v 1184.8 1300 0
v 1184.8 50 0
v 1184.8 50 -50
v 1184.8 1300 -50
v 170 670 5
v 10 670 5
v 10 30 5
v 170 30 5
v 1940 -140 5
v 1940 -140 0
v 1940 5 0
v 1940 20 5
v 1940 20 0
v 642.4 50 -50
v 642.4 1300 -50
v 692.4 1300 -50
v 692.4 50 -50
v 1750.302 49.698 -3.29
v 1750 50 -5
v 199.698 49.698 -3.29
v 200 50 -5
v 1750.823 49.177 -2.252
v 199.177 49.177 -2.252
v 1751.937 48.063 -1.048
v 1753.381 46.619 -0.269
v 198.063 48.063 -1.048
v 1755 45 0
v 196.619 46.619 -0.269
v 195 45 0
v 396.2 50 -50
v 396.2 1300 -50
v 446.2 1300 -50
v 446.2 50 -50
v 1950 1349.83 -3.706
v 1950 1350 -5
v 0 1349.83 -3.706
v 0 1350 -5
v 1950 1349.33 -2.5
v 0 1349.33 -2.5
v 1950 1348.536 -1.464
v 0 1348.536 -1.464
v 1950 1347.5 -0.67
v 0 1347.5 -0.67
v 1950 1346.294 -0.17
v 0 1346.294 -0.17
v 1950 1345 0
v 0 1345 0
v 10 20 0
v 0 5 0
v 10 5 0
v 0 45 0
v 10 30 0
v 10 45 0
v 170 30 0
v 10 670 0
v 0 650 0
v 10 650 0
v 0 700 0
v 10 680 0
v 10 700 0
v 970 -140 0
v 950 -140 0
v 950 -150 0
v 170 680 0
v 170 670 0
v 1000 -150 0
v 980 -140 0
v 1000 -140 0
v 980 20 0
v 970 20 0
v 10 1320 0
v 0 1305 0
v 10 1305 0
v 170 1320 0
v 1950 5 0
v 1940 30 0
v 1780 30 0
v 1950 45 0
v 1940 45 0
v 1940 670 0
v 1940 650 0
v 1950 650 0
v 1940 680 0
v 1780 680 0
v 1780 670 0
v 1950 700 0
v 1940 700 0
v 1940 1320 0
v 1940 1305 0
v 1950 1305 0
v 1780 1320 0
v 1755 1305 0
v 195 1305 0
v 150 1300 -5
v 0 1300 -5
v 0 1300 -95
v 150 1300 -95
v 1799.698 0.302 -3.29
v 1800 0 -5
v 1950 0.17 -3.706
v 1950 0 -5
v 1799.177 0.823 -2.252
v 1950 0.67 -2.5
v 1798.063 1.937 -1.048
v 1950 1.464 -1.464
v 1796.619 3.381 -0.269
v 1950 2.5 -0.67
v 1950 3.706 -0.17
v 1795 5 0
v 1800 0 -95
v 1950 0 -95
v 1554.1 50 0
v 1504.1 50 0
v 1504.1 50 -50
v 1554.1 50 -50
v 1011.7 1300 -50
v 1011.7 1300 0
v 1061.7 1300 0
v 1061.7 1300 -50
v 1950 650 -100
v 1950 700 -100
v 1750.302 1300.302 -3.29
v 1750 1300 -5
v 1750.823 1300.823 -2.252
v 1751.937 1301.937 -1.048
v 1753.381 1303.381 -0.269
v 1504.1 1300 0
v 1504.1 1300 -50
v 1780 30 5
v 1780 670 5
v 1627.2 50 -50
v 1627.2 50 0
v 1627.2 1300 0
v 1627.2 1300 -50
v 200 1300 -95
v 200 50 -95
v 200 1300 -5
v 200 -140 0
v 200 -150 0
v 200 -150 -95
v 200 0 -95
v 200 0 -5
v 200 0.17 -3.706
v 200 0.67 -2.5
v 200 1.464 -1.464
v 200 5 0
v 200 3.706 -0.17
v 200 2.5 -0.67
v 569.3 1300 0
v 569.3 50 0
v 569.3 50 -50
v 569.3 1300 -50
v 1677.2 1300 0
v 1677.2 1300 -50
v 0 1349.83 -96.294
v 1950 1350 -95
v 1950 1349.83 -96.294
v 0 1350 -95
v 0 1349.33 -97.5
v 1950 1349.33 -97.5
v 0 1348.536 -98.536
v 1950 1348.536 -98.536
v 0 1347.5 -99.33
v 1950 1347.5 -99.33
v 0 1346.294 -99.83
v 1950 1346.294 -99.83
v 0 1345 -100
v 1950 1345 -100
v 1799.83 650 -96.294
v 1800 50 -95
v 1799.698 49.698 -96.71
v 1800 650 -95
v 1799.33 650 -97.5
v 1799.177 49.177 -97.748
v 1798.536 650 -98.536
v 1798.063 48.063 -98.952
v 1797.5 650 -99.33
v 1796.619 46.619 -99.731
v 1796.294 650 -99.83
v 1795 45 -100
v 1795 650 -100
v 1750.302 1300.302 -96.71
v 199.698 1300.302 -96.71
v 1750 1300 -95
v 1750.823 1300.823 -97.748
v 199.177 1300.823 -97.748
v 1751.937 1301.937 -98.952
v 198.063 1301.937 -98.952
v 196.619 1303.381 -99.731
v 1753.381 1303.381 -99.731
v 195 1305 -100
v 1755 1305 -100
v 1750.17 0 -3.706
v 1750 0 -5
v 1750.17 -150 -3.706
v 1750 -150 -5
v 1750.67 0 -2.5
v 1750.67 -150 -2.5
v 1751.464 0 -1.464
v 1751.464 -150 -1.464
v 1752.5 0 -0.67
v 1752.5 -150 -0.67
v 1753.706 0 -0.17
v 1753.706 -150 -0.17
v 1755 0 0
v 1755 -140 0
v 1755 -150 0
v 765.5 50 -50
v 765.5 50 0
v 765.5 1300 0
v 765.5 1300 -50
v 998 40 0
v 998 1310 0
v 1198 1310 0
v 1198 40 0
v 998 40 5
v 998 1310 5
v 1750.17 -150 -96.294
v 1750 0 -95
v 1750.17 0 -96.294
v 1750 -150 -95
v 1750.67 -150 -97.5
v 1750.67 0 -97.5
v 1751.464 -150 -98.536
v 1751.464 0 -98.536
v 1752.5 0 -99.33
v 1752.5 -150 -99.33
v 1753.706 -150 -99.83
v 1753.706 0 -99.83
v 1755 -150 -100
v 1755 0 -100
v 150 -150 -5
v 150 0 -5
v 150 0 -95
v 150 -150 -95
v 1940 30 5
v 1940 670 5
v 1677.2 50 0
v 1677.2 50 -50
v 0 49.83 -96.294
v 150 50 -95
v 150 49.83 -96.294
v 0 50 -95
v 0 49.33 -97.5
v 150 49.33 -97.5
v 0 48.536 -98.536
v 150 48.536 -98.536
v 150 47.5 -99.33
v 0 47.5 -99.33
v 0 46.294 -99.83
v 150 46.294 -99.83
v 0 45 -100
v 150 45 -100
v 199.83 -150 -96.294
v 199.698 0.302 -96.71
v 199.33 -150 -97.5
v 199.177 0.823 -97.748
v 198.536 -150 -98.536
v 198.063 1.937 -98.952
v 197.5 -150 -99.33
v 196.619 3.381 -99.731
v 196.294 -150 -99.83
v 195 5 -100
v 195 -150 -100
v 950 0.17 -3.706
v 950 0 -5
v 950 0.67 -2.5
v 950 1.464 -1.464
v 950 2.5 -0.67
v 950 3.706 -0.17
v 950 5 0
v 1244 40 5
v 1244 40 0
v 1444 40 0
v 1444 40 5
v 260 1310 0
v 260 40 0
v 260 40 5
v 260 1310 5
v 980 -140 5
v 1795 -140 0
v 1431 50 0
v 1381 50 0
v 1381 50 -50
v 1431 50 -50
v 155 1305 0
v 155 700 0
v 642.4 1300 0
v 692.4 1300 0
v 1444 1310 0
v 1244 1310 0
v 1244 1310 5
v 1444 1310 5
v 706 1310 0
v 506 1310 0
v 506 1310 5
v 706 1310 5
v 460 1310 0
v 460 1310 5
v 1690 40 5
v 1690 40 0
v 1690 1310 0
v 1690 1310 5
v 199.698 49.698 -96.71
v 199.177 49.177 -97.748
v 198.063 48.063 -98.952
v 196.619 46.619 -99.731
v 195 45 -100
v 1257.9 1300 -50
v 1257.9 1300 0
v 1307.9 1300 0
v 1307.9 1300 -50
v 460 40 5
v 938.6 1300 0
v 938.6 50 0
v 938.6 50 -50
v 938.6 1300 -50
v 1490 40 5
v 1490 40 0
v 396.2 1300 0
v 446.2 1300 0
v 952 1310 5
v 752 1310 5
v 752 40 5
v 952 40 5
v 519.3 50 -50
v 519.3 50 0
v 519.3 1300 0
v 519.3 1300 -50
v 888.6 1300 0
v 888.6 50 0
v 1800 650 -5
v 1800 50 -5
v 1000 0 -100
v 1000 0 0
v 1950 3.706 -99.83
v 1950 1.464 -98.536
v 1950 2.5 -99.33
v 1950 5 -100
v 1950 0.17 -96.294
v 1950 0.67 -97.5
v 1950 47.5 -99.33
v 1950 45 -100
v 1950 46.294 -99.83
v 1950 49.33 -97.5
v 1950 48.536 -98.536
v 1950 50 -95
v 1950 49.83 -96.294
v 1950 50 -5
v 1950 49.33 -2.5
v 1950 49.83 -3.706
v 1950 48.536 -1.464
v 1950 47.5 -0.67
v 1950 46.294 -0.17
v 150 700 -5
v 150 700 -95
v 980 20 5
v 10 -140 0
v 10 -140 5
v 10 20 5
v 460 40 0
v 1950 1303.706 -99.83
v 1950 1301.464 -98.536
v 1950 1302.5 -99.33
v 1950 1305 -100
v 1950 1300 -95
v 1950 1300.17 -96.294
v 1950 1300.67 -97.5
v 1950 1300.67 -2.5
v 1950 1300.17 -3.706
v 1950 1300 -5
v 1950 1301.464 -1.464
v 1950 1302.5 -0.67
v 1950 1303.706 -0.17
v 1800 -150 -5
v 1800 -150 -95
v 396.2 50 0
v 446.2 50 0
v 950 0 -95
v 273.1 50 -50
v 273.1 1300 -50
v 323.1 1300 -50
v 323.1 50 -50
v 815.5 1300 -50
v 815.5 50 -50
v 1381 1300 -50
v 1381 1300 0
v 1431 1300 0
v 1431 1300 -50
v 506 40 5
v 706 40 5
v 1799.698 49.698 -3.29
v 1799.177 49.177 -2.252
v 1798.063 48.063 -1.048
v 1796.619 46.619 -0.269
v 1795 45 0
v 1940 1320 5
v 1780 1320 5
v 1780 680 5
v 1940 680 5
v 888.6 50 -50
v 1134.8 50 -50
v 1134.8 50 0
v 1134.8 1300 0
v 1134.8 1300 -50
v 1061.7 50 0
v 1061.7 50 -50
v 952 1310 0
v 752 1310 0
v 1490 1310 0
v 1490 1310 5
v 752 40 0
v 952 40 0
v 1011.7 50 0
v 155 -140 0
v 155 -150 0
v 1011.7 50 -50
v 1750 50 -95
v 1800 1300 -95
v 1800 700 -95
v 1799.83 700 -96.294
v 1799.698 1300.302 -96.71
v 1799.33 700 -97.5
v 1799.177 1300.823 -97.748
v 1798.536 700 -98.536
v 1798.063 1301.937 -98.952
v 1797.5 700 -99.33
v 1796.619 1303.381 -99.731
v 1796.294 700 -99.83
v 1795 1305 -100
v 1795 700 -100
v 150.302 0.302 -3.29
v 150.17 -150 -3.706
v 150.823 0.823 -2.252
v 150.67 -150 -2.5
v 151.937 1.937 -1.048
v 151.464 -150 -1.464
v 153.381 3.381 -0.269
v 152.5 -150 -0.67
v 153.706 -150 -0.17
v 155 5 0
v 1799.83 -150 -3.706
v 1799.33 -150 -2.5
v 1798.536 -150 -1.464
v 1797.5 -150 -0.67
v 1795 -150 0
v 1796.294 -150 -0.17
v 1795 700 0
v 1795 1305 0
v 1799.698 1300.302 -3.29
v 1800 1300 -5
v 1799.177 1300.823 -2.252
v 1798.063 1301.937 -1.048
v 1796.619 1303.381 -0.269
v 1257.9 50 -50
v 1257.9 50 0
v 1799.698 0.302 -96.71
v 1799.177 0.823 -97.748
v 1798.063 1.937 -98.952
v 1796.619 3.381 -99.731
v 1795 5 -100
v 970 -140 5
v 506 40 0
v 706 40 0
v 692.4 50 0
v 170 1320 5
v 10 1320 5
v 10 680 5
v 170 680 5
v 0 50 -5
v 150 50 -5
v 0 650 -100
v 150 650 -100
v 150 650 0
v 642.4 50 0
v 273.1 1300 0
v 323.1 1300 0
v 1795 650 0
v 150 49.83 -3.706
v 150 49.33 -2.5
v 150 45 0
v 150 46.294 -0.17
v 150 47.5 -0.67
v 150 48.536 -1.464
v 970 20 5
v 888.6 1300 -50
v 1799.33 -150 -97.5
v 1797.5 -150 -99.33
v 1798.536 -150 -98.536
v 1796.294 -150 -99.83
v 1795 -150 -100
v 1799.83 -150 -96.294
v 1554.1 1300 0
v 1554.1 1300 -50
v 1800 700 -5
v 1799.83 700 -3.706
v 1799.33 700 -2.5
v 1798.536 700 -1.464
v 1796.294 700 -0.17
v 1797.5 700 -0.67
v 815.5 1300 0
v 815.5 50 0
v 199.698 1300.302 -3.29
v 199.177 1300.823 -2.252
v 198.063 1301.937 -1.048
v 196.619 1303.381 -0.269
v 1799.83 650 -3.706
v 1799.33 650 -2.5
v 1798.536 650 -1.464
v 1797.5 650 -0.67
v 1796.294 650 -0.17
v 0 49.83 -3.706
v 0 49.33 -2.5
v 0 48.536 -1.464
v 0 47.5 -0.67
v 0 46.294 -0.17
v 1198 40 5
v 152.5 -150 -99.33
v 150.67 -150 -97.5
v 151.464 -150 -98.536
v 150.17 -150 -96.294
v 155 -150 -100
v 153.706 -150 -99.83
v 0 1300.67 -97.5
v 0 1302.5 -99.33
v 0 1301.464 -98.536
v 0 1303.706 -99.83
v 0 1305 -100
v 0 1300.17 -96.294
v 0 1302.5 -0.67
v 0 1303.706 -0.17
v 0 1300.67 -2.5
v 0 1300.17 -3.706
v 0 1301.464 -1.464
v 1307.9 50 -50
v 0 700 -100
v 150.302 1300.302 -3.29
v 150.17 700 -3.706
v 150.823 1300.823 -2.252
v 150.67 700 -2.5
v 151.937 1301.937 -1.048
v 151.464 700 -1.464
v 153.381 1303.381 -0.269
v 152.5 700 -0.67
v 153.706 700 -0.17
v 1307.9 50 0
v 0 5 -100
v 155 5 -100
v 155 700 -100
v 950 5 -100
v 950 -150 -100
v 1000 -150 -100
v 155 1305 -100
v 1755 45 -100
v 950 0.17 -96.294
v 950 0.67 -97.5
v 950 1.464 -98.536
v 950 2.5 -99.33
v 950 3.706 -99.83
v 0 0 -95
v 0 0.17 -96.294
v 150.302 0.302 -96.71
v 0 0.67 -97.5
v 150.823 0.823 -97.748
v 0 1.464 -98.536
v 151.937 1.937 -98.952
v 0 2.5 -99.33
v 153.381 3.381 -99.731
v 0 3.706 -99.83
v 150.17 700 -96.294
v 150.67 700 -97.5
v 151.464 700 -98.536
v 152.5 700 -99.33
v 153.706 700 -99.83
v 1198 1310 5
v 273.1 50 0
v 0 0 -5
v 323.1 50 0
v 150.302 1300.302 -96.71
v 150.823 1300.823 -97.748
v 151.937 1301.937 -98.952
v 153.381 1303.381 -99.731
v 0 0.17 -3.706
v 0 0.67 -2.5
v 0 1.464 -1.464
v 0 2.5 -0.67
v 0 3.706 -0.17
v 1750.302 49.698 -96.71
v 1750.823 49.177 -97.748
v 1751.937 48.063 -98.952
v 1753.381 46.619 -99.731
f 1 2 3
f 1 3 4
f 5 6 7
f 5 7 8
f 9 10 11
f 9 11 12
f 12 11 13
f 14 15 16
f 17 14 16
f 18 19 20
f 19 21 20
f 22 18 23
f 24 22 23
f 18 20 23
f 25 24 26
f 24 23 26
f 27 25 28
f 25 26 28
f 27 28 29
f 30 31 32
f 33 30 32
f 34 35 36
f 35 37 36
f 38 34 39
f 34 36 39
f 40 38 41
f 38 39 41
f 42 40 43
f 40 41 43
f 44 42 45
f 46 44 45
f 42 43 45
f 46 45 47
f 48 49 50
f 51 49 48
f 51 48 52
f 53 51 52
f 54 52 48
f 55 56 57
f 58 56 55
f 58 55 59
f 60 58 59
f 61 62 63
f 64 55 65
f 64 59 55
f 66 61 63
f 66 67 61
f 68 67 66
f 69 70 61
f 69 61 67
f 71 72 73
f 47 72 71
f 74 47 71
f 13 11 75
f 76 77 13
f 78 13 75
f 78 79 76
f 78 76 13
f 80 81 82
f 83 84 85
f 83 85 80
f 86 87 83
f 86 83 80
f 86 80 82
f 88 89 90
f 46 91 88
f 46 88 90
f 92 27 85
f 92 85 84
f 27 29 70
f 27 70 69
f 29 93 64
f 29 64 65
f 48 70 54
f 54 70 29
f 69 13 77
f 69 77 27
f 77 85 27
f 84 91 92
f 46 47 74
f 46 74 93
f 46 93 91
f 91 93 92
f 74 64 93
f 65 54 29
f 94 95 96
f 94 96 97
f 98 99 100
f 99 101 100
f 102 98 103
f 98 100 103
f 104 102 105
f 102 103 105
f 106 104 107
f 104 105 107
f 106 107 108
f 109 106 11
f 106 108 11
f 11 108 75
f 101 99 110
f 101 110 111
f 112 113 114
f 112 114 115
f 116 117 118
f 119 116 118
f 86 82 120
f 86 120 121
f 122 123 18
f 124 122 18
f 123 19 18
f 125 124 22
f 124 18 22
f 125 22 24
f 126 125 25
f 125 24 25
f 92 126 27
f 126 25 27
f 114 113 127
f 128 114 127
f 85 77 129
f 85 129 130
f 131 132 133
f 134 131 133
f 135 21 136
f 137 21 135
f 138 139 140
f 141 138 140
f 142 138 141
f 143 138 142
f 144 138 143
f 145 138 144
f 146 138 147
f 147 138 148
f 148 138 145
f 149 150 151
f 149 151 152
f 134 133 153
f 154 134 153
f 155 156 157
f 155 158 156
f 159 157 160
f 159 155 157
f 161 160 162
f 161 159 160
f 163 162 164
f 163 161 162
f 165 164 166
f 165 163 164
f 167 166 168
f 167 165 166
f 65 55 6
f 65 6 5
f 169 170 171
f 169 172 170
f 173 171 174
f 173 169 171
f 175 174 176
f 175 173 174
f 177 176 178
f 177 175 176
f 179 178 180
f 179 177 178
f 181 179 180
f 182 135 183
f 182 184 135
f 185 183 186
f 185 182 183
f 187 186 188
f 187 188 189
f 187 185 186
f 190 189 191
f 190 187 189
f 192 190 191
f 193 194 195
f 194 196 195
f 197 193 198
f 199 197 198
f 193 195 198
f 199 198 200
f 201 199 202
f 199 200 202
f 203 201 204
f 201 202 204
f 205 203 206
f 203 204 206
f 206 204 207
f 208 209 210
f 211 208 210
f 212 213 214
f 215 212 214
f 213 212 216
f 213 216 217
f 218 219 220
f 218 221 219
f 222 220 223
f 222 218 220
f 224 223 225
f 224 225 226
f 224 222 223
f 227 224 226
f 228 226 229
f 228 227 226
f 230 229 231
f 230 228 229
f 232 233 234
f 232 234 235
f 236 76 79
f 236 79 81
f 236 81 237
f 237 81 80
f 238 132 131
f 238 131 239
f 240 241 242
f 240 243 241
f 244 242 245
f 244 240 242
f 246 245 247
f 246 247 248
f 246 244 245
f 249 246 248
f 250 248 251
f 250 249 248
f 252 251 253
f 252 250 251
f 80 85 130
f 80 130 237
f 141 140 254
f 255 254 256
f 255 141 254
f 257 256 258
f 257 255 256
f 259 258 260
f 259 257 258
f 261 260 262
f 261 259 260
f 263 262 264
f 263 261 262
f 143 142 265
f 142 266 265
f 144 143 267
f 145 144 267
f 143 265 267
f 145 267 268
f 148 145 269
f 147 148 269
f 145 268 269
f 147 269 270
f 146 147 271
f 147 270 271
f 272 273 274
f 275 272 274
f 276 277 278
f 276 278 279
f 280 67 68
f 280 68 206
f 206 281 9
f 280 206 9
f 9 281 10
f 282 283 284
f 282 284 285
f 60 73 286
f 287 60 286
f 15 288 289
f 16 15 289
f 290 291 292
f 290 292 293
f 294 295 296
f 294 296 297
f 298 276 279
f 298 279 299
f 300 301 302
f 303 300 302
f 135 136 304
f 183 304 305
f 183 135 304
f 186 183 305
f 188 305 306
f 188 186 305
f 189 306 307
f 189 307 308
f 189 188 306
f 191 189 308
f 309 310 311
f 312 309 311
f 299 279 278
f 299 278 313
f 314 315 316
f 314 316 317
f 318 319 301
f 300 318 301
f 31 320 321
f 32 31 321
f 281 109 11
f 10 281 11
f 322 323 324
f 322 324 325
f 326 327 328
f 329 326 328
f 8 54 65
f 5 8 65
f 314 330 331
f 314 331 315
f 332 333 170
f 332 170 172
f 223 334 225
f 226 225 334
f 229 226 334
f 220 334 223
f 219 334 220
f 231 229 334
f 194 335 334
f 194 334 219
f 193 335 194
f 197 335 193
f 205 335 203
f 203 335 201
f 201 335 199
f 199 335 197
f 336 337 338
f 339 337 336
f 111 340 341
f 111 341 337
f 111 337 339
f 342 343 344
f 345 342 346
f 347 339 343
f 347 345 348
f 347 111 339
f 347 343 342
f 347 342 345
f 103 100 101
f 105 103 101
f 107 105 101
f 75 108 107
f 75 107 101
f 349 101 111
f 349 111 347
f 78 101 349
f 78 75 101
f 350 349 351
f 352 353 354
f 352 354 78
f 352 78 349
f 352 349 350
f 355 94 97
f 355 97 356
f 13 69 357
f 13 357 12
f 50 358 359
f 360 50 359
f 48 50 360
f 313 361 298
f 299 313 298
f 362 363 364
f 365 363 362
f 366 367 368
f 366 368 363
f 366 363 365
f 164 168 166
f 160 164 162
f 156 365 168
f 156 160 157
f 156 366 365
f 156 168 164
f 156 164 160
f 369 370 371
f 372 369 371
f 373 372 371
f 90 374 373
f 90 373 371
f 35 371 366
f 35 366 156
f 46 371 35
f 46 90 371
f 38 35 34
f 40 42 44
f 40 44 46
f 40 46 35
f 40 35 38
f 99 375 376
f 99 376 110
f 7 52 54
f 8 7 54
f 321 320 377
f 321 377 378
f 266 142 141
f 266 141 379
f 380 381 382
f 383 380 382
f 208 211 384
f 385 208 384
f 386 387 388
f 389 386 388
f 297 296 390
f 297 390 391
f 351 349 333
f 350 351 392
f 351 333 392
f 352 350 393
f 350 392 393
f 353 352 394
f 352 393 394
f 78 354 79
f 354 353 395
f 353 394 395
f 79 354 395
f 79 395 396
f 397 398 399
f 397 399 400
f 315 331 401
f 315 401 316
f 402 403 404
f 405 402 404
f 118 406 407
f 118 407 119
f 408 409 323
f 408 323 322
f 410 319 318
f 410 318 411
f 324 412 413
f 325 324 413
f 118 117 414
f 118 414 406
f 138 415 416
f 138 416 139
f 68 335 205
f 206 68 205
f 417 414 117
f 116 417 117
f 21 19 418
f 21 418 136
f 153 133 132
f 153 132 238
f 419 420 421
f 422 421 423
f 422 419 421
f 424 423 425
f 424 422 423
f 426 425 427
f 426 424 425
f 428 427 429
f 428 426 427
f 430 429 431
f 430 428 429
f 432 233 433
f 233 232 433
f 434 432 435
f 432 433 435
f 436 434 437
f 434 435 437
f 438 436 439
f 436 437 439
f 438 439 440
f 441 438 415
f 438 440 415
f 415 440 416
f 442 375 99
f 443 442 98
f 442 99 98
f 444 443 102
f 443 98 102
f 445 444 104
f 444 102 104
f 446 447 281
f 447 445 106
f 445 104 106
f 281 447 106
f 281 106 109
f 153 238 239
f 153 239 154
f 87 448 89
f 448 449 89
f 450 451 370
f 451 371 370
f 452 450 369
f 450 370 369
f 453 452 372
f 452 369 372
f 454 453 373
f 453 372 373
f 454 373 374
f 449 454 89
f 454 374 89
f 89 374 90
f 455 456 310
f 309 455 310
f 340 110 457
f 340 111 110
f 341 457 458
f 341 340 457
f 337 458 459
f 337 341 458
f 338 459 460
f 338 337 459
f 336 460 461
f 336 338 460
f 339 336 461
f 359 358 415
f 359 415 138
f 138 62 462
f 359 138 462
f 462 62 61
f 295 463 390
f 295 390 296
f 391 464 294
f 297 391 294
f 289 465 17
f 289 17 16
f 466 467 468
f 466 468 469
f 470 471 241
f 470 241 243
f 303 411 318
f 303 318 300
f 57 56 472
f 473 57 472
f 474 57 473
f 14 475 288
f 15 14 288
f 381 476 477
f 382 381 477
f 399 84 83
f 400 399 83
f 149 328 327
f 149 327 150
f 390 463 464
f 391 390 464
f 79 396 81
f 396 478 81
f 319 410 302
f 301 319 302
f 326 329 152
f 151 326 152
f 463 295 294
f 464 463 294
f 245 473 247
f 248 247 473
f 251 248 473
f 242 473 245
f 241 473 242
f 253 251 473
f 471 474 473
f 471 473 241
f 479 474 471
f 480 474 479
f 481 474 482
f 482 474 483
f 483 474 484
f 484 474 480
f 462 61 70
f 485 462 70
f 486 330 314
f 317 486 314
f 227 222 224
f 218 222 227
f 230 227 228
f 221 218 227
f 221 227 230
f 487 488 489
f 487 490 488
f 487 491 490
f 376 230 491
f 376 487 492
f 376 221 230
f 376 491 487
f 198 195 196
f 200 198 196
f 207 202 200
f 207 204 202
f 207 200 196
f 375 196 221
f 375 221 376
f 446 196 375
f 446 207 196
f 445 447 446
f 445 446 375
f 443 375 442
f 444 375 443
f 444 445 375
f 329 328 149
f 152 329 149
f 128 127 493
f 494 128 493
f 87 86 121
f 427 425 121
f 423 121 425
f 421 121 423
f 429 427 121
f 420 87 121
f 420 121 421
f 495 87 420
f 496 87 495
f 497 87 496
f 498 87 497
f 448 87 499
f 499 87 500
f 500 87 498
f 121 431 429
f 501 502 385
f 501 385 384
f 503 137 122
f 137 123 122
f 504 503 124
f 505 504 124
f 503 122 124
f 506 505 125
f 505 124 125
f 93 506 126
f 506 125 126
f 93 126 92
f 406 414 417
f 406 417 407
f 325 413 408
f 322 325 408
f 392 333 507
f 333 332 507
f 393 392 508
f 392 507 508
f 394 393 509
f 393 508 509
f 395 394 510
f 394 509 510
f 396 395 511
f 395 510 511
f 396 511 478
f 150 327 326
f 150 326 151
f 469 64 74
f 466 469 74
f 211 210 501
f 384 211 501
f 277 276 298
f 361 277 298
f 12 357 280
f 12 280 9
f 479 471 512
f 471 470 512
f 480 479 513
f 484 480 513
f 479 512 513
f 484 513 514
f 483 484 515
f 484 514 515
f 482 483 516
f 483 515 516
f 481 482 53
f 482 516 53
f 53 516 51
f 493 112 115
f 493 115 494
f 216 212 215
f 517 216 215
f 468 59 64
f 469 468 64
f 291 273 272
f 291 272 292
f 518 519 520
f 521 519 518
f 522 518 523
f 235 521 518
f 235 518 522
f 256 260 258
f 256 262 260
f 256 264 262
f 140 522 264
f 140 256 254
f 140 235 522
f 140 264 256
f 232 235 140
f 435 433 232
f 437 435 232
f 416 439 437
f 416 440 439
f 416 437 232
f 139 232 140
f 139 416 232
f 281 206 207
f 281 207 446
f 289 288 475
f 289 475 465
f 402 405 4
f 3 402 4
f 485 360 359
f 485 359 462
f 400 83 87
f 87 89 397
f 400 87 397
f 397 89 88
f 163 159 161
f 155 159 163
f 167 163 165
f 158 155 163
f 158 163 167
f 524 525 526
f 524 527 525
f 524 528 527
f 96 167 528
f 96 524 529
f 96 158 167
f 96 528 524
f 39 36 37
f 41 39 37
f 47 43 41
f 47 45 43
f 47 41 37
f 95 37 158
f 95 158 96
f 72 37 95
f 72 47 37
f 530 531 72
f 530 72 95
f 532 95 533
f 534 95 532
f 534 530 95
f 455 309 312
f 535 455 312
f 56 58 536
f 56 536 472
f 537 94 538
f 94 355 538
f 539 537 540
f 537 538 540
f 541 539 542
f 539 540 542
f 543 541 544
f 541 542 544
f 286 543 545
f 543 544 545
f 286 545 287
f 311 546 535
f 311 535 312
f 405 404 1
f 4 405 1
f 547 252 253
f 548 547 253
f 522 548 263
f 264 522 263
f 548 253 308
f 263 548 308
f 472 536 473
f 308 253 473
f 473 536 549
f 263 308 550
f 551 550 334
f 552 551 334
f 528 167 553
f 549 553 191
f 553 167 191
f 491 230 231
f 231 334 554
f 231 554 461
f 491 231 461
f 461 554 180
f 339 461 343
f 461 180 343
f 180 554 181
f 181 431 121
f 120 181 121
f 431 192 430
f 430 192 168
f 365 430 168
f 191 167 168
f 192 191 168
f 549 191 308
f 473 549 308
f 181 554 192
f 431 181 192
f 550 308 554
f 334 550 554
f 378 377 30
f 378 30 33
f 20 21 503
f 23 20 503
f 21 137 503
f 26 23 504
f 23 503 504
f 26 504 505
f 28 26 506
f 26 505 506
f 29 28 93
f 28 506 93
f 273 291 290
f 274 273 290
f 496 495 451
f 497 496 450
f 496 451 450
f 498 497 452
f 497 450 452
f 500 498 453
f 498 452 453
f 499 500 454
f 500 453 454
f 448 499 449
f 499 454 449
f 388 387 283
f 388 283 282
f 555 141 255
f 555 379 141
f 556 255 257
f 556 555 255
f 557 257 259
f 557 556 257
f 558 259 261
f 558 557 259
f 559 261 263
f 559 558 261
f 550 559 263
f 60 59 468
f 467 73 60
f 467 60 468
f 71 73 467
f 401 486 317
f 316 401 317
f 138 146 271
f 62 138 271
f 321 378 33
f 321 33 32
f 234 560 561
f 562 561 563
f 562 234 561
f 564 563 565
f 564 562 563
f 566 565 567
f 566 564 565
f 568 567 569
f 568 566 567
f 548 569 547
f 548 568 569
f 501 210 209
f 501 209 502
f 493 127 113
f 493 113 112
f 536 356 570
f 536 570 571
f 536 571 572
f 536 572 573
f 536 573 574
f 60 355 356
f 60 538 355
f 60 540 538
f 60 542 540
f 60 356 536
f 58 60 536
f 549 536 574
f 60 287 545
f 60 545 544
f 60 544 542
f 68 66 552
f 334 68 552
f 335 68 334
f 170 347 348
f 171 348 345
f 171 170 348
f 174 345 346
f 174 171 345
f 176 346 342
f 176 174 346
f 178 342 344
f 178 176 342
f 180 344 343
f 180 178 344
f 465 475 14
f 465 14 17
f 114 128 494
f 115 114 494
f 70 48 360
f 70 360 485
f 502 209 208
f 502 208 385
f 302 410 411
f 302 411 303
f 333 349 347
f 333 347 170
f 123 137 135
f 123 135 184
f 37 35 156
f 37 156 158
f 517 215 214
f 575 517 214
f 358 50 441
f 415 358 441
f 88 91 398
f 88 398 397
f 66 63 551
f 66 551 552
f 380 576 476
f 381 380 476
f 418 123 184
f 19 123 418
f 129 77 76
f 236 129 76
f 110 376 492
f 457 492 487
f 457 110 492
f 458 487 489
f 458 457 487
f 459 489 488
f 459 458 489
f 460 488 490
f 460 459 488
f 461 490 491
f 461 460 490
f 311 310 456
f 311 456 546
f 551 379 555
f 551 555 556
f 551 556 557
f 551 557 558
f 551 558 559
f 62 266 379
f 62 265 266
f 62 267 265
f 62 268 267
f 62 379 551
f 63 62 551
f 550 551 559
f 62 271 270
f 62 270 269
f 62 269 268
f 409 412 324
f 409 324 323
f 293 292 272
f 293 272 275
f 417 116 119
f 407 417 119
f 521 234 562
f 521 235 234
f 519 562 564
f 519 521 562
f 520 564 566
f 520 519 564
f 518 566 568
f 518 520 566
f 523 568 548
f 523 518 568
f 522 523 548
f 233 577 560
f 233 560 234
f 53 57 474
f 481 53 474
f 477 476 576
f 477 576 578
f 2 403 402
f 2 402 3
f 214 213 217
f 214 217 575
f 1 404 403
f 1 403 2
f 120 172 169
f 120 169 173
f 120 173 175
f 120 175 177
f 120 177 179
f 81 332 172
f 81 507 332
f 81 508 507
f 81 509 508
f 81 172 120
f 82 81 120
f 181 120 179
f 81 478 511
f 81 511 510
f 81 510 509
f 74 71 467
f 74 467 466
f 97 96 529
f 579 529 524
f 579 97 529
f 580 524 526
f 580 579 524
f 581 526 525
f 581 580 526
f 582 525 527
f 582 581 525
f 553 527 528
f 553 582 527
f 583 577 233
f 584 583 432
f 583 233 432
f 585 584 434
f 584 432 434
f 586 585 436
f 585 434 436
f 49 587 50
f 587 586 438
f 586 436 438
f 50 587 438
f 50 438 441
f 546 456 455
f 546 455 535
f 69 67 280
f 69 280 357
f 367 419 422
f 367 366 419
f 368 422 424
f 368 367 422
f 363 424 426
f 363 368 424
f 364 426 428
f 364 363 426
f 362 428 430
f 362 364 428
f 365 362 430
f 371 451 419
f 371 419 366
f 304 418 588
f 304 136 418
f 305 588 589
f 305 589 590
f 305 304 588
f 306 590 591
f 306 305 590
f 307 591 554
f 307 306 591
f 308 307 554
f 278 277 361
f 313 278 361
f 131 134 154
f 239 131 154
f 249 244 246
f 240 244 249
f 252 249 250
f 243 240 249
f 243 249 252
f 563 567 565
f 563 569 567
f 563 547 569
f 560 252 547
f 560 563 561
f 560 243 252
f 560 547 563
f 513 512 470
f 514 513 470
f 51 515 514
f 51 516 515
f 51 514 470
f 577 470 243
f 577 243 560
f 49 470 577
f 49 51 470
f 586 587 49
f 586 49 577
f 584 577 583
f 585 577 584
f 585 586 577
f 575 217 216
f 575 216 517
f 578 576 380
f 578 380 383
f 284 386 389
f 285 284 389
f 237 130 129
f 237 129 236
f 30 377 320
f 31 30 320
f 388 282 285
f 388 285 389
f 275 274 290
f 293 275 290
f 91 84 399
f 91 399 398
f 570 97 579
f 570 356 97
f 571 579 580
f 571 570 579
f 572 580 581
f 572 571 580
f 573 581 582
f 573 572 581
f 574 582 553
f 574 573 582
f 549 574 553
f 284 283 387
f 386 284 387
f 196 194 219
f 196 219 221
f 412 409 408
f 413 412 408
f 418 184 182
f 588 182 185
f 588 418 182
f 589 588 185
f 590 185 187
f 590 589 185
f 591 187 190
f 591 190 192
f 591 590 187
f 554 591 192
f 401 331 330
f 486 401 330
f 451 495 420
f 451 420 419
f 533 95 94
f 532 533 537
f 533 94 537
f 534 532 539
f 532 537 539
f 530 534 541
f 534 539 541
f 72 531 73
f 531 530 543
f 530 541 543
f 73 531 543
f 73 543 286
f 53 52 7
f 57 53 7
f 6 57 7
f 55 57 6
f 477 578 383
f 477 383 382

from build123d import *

# Parameters (mm, degrees)
F1_DEPTH = 100
F2_R     = 5
F0_W     = 50
F0_H     = 1250
F3_DEPTH = 50
F5_W     = 960
F5_H     = 160
F5_W_2   = 160
F5_H_2   = 640
F6_DEPTH = 5
F7_W     = 200
F7_H     = 1270
F8_DEPTH = 5


# Not quite as in the source:
# - two fillets or chamfers of one size are made in one step


with BuildPart() as f1:
    # F0 (on Top) → F1 (new body)
    with BuildSketch(Plane.XY):
        Polygon((0, 50), (0, 0), (150, 0), (150, -150), (200, -150), (200, 0), (950, 0), (950, -150), (1000, -150), (1000, 0), (1750, 0), (1750, -150), (1800, -150), (1800, 0), (1950, 0), (1950, 50), (1800, 50), (1800, 650), (1800, 700), (1800, 1300), (1950, 1300), (1950, 1350), (0, 1350), (0, 1300), (150, 1300), (150, 700), (0, 700), (0, 675), (0, 650), (150, 650), (150, 50), align=None)
        Polygon((200, 50), (200, 1300), (273.1, 1300), (323.1, 1300), (396.2, 1300), (446.2, 1300), (519.3, 1300), (569.3, 1300), (642.4, 1300), (692.4, 1300), (765.5, 1300), (815.5, 1300), (888.6, 1300), (938.6, 1300), (1011.7, 1300), (1061.7, 1300), (1134.8, 1300), (1184.8, 1300), (1257.9, 1300), (1307.9, 1300), (1381, 1300), (1431, 1300), (1504.1, 1300), (1554.1, 1300), (1627.2, 1300), (1677.2, 1300), (1750, 1300), (1750, 50), (1677.2, 50), (1627.2, 50), (1554.1, 50), (1504.1, 50), (1431, 50), (1381, 50), (1307.9, 50), (1257.9, 50), (1184.8, 50), (1134.8, 50), (1061.7, 50), (1011.7, 50), (938.6, 50), (888.6, 50), (815.5, 50), (765.5, 50), (692.4, 50), (642.4, 50), (569.3, 50), (519.3, 50), (446.2, 50), (396.2, 50), (323.1, 50), (273.1, 50), align=None, mode=Mode.SUBTRACT)
        Polygon((1950, 700), (1800, 700), (1800, 650), (1950, 650), (1950, 675), align=None)
    extrude(amount=-F1_DEPTH)

    # F2
    f2_edges = [f1.edges().sort_by_distance(p)[0] for p in [
        (75, 1300, 0),
        (975, 1350, 0),
        (975, 1300, 0),
        (200, 675, 0),
        (150, 1000, 0),
        (575, 0, 0),
        (975, 50, 0),
        (75, 50, 0),
        (75, 0, 0),
        (150, -75, 0),
        (1750, 675, 0),
        (1800, 350, 0),
        (1800, 1000, 0),
        (1875, 50, 0),
        (1875, 0, 0),
        (1800, -75, 0),
        (1750, -75, 0),
        (1875, 1300, 0),
        (75, 0, -100),
        (150, -75, -100),
        (200, -75, -100),
        (575, 0, -100),
        (1750, -75, -100),
        (1800, -75, -100),
        (1875, 0, -100),
        (1875, 50, -100),
        (1800, 350, -100),
        (1800, 1000, -100),
        (1875, 1300, -100),
        (975, 1350, -100),
        (75, 1300, -100),
        (150, 1000, -100),
        (75, 50, -100),
        (200, 675, -100),
        (975, 1300, -100),
        (1750, 675, -100),
        (975, 50, -100),
    ]]
    fillet(f2_edges, radius=F2_R)

    # F5 (on Top) → F6 (join)
    with BuildSketch(Plane.XY):
        with Locations((1460, -60)):
            Rectangle(F5_W, F5_H)
        with Locations((490, -60)):
            Rectangle(F5_W, F5_H)
        with Locations((90, 1000)):
            Rectangle(F5_W_2, F5_H_2)
        with Locations((90, 350)):
            Rectangle(F5_W_2, F5_H_2)
        with Locations((1860, 350)):
            Rectangle(F5_W_2, F5_H_2)
        with Locations((1860, 1000)):
            Rectangle(F5_W_2, F5_H_2)
    extrude(amount=F6_DEPTH)


with BuildPart() as f3:
    # F0 (on Top) → F3 (new body)
    with BuildSketch(Plane.XY):
        with Locations((298.1, 675)):
            Rectangle(F0_W, F0_H)
    extrude(amount=-F3_DEPTH)


with BuildPart() as f3b:
    # F0 (on Top) → F3, piece 2 (new body)
    with BuildSketch(Plane.XY):
        with Locations((421.2, 675)):
            Rectangle(F0_W, F0_H)
    extrude(amount=-F3_DEPTH)


with BuildPart() as f3c:
    # F0 (on Top) → F3, piece 3 (new body)
    with BuildSketch(Plane.XY):
        with Locations((544.3, 675)):
            Rectangle(F0_W, F0_H)
    extrude(amount=-F3_DEPTH)


with BuildPart() as f3d:
    # F0 (on Top) → F3, piece 4 (new body)
    with BuildSketch(Plane.XY):
        with Locations((667.4, 675)):
            Rectangle(F0_W, F0_H)
    extrude(amount=-F3_DEPTH)


with BuildPart() as f3e:
    # F0 (on Top) → F3, piece 5 (new body)
    with BuildSketch(Plane.XY):
        with Locations((790.5, 675)):
            Rectangle(F0_W, F0_H)
    extrude(amount=-F3_DEPTH)


with BuildPart() as f3f:
    # F0 (on Top) → F3, piece 6 (new body)
    with BuildSketch(Plane.XY):
        with Locations((913.6, 675)):
            Rectangle(F0_W, F0_H)
    extrude(amount=-F3_DEPTH)


with BuildPart() as f3g:
    # F0 (on Top) → F3, piece 7 (new body)
    with BuildSketch(Plane.XY):
        with Locations((1036.7, 675)):
            Rectangle(F0_W, F0_H)
    extrude(amount=-F3_DEPTH)


with BuildPart() as f3h:
    # F0 (on Top) → F3, piece 8 (new body)
    with BuildSketch(Plane.XY):
        with Locations((1159.8, 675)):
            Rectangle(F0_W, F0_H)
    extrude(amount=-F3_DEPTH)


with BuildPart() as f3i:
    # F0 (on Top) → F3, piece 9 (new body)
    with BuildSketch(Plane.XY):
        with Locations((1282.9, 675)):
            Rectangle(F0_W, F0_H)
    extrude(amount=-F3_DEPTH)


with BuildPart() as f3j:
    # F0 (on Top) → F3, piece 10 (new body)
    with BuildSketch(Plane.XY):
        with Locations((1406, 675)):
            Rectangle(F0_W, F0_H)
    extrude(amount=-F3_DEPTH)


with BuildPart() as f3k:
    # F0 (on Top) → F3, piece 11 (new body)
    with BuildSketch(Plane.XY):
        with Locations((1529.1, 675)):
            Rectangle(F0_W, F0_H)
    extrude(amount=-F3_DEPTH)


with BuildPart() as f3l:
    # F0 (on Top) → F3, piece 12 (new body)
    with BuildSketch(Plane.XY):
        with Locations((1652.2, 675)):
            Rectangle(F0_W, F0_H)
    extrude(amount=-F3_DEPTH)


with BuildPart() as f8:
    # F7 (on Top) → F8 (new body)
    with BuildSketch(Plane.XY):
        with Locations((360, 675)):
            Rectangle(F7_W, F7_H)
    extrude(amount=F8_DEPTH)


with BuildPart() as f8b:
    # F7 (on Top) → F8, piece 2 (new body)
    with BuildSketch(Plane.XY):
        with Locations((606, 675)):
            Rectangle(F7_W, F7_H)
    extrude(amount=F8_DEPTH)


with BuildPart() as f8c:
    # F7 (on Top) → F8, piece 3 (new body)
    with BuildSketch(Plane.XY):
        with Locations((852, 675)):
            Rectangle(F7_W, F7_H)
    extrude(amount=F8_DEPTH)


with BuildPart() as f8d:
    # F7 (on Top) → F8, piece 4 (new body)
    with BuildSketch(Plane.XY):
        with Locations((1098, 675)):
            Rectangle(F7_W, F7_H)
    extrude(amount=F8_DEPTH)


with BuildPart() as f8e:
    # F7 (on Top) → F8, piece 5 (new body)
    with BuildSketch(Plane.XY):
        with Locations((1344, 675)):
            Rectangle(F7_W, F7_H)
    extrude(amount=F8_DEPTH)


with BuildPart() as f8f:
    # F7 (on Top) → F8, piece 6 (new body)
    with BuildSketch(Plane.XY):
        with Locations((1590, 675)):
            Rectangle(F7_W, F7_H)
    extrude(amount=F8_DEPTH)


solid = Compound([f1.part, f3.part, f3b.part, f3c.part, f3d.part, f3e.part, f3f.part, f3g.part, f3h.part, f3i.part, f3j.part, f3k.part, f3l.part, f8.part, f8b.part, f8c.part, f8d.part, f8e.part, f8f.part])
